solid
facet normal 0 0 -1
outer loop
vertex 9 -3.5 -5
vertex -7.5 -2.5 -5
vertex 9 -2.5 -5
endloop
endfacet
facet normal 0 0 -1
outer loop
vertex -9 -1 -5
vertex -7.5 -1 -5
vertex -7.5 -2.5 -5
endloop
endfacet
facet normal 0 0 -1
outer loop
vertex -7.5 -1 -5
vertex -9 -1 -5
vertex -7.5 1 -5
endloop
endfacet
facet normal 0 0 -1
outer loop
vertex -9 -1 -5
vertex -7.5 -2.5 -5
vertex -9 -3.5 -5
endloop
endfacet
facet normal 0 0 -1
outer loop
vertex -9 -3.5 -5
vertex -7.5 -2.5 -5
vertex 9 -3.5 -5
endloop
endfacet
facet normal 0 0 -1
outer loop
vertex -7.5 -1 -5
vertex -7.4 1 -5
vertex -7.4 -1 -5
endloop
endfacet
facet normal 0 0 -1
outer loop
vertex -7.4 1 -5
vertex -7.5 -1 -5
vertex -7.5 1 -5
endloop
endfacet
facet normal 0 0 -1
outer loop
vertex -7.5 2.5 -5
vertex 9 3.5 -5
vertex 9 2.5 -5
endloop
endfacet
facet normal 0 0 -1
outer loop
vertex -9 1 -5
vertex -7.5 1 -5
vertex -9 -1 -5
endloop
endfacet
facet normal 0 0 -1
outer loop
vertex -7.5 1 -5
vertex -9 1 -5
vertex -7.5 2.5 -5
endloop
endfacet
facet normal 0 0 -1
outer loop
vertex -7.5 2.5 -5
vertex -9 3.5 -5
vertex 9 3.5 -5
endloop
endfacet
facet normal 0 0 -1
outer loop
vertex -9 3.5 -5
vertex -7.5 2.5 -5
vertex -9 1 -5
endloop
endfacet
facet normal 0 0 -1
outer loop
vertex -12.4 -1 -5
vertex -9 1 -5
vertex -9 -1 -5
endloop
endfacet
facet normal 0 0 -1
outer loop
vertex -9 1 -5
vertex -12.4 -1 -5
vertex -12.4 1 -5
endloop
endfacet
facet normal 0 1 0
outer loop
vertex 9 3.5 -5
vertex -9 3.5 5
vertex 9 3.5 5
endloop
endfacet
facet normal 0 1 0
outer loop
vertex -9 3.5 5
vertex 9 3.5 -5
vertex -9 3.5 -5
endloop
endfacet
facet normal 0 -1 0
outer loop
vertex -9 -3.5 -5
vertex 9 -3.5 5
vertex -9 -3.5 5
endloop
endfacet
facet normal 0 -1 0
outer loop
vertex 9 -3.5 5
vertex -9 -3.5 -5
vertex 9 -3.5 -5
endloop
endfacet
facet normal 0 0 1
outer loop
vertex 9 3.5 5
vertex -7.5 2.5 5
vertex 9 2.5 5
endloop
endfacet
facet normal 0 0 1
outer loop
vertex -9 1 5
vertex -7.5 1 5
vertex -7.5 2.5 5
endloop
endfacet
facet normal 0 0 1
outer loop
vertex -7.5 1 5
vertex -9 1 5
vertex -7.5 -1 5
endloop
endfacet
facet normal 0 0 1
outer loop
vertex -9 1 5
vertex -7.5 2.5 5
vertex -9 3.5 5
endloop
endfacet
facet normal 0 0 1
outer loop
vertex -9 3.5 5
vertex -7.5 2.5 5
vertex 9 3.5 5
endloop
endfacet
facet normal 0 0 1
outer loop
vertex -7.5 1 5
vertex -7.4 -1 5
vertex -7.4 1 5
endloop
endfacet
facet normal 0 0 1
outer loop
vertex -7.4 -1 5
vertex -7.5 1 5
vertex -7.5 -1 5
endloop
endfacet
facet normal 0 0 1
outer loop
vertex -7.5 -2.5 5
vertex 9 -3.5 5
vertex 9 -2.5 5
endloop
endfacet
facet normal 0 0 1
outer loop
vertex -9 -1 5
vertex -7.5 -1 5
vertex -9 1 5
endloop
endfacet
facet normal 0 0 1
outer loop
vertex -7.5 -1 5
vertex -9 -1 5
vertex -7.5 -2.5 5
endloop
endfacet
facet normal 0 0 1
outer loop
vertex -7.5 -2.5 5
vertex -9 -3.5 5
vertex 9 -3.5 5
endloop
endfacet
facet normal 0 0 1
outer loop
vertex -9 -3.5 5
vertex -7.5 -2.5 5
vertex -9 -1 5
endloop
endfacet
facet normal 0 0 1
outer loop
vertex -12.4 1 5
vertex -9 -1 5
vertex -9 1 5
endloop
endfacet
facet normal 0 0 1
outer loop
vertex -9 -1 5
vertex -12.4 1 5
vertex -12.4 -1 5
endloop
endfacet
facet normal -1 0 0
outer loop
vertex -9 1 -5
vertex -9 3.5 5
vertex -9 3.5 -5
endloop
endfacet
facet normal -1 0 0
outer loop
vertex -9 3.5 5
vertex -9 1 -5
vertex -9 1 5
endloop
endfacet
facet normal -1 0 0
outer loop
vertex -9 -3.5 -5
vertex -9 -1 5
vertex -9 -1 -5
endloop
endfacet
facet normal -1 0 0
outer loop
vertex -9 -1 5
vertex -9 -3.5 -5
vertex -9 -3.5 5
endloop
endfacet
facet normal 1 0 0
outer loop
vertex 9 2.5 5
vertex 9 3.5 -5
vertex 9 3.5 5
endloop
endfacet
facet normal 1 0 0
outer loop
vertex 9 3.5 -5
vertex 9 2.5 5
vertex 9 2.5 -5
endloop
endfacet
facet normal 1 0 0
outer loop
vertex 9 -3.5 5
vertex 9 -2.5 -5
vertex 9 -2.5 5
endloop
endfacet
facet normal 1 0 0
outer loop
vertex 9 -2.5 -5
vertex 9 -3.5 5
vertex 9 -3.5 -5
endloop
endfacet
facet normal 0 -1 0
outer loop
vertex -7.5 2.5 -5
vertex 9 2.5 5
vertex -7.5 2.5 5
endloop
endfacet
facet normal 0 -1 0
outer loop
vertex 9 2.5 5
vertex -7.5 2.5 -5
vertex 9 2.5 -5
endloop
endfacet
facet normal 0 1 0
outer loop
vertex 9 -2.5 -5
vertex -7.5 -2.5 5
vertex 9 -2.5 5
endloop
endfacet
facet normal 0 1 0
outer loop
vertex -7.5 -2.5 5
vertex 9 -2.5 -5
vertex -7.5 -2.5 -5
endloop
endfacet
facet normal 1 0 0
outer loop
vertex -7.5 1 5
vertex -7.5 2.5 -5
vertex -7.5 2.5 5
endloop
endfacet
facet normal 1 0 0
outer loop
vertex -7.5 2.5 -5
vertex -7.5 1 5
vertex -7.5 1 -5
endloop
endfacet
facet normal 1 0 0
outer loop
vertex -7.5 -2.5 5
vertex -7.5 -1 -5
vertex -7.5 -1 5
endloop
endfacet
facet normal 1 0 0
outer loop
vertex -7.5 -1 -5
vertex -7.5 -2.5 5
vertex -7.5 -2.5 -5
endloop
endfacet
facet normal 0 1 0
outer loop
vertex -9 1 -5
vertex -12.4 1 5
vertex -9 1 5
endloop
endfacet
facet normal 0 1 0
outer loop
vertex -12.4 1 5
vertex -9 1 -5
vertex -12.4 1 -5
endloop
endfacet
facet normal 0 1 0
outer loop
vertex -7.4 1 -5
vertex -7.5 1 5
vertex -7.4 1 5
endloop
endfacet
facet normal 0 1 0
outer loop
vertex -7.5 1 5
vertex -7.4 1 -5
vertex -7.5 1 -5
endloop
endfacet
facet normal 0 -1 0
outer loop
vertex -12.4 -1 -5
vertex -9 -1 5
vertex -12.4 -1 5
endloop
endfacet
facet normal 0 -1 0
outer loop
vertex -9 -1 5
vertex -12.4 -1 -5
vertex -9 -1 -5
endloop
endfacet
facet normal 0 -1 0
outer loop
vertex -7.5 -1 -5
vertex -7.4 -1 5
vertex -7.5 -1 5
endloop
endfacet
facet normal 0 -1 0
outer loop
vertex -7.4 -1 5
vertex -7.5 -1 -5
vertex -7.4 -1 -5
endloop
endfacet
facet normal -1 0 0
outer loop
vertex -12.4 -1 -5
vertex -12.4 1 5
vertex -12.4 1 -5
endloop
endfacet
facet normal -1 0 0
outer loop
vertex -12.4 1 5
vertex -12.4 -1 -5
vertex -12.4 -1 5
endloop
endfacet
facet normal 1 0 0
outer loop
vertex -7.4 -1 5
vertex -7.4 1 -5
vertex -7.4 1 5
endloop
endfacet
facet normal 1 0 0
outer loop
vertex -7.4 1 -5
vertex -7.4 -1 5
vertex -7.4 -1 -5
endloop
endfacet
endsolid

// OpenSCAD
// laptop camera privacy shield

// dimension variables in mm -- should fit a macbook air by default
lid_thickness = 5; // your laptop's lid thickness
width = 10; // the desired shield width
height = 15; // distance from edge to screen (or slightly less)
buldge = 2; //The distance from the bottom to top of the shield

rotate([0,90,90]) {

// main shield
difference() {
cube([width, height+3, lid_thickness+buldge], center=true);
translate(v=[0,-1,0]) cube([width+4, height+2, lid_thickness], center=true);
}

// tab
translate(v=[0,height-(height*0.34),0]) cube([width,5,2],center=true);

}
